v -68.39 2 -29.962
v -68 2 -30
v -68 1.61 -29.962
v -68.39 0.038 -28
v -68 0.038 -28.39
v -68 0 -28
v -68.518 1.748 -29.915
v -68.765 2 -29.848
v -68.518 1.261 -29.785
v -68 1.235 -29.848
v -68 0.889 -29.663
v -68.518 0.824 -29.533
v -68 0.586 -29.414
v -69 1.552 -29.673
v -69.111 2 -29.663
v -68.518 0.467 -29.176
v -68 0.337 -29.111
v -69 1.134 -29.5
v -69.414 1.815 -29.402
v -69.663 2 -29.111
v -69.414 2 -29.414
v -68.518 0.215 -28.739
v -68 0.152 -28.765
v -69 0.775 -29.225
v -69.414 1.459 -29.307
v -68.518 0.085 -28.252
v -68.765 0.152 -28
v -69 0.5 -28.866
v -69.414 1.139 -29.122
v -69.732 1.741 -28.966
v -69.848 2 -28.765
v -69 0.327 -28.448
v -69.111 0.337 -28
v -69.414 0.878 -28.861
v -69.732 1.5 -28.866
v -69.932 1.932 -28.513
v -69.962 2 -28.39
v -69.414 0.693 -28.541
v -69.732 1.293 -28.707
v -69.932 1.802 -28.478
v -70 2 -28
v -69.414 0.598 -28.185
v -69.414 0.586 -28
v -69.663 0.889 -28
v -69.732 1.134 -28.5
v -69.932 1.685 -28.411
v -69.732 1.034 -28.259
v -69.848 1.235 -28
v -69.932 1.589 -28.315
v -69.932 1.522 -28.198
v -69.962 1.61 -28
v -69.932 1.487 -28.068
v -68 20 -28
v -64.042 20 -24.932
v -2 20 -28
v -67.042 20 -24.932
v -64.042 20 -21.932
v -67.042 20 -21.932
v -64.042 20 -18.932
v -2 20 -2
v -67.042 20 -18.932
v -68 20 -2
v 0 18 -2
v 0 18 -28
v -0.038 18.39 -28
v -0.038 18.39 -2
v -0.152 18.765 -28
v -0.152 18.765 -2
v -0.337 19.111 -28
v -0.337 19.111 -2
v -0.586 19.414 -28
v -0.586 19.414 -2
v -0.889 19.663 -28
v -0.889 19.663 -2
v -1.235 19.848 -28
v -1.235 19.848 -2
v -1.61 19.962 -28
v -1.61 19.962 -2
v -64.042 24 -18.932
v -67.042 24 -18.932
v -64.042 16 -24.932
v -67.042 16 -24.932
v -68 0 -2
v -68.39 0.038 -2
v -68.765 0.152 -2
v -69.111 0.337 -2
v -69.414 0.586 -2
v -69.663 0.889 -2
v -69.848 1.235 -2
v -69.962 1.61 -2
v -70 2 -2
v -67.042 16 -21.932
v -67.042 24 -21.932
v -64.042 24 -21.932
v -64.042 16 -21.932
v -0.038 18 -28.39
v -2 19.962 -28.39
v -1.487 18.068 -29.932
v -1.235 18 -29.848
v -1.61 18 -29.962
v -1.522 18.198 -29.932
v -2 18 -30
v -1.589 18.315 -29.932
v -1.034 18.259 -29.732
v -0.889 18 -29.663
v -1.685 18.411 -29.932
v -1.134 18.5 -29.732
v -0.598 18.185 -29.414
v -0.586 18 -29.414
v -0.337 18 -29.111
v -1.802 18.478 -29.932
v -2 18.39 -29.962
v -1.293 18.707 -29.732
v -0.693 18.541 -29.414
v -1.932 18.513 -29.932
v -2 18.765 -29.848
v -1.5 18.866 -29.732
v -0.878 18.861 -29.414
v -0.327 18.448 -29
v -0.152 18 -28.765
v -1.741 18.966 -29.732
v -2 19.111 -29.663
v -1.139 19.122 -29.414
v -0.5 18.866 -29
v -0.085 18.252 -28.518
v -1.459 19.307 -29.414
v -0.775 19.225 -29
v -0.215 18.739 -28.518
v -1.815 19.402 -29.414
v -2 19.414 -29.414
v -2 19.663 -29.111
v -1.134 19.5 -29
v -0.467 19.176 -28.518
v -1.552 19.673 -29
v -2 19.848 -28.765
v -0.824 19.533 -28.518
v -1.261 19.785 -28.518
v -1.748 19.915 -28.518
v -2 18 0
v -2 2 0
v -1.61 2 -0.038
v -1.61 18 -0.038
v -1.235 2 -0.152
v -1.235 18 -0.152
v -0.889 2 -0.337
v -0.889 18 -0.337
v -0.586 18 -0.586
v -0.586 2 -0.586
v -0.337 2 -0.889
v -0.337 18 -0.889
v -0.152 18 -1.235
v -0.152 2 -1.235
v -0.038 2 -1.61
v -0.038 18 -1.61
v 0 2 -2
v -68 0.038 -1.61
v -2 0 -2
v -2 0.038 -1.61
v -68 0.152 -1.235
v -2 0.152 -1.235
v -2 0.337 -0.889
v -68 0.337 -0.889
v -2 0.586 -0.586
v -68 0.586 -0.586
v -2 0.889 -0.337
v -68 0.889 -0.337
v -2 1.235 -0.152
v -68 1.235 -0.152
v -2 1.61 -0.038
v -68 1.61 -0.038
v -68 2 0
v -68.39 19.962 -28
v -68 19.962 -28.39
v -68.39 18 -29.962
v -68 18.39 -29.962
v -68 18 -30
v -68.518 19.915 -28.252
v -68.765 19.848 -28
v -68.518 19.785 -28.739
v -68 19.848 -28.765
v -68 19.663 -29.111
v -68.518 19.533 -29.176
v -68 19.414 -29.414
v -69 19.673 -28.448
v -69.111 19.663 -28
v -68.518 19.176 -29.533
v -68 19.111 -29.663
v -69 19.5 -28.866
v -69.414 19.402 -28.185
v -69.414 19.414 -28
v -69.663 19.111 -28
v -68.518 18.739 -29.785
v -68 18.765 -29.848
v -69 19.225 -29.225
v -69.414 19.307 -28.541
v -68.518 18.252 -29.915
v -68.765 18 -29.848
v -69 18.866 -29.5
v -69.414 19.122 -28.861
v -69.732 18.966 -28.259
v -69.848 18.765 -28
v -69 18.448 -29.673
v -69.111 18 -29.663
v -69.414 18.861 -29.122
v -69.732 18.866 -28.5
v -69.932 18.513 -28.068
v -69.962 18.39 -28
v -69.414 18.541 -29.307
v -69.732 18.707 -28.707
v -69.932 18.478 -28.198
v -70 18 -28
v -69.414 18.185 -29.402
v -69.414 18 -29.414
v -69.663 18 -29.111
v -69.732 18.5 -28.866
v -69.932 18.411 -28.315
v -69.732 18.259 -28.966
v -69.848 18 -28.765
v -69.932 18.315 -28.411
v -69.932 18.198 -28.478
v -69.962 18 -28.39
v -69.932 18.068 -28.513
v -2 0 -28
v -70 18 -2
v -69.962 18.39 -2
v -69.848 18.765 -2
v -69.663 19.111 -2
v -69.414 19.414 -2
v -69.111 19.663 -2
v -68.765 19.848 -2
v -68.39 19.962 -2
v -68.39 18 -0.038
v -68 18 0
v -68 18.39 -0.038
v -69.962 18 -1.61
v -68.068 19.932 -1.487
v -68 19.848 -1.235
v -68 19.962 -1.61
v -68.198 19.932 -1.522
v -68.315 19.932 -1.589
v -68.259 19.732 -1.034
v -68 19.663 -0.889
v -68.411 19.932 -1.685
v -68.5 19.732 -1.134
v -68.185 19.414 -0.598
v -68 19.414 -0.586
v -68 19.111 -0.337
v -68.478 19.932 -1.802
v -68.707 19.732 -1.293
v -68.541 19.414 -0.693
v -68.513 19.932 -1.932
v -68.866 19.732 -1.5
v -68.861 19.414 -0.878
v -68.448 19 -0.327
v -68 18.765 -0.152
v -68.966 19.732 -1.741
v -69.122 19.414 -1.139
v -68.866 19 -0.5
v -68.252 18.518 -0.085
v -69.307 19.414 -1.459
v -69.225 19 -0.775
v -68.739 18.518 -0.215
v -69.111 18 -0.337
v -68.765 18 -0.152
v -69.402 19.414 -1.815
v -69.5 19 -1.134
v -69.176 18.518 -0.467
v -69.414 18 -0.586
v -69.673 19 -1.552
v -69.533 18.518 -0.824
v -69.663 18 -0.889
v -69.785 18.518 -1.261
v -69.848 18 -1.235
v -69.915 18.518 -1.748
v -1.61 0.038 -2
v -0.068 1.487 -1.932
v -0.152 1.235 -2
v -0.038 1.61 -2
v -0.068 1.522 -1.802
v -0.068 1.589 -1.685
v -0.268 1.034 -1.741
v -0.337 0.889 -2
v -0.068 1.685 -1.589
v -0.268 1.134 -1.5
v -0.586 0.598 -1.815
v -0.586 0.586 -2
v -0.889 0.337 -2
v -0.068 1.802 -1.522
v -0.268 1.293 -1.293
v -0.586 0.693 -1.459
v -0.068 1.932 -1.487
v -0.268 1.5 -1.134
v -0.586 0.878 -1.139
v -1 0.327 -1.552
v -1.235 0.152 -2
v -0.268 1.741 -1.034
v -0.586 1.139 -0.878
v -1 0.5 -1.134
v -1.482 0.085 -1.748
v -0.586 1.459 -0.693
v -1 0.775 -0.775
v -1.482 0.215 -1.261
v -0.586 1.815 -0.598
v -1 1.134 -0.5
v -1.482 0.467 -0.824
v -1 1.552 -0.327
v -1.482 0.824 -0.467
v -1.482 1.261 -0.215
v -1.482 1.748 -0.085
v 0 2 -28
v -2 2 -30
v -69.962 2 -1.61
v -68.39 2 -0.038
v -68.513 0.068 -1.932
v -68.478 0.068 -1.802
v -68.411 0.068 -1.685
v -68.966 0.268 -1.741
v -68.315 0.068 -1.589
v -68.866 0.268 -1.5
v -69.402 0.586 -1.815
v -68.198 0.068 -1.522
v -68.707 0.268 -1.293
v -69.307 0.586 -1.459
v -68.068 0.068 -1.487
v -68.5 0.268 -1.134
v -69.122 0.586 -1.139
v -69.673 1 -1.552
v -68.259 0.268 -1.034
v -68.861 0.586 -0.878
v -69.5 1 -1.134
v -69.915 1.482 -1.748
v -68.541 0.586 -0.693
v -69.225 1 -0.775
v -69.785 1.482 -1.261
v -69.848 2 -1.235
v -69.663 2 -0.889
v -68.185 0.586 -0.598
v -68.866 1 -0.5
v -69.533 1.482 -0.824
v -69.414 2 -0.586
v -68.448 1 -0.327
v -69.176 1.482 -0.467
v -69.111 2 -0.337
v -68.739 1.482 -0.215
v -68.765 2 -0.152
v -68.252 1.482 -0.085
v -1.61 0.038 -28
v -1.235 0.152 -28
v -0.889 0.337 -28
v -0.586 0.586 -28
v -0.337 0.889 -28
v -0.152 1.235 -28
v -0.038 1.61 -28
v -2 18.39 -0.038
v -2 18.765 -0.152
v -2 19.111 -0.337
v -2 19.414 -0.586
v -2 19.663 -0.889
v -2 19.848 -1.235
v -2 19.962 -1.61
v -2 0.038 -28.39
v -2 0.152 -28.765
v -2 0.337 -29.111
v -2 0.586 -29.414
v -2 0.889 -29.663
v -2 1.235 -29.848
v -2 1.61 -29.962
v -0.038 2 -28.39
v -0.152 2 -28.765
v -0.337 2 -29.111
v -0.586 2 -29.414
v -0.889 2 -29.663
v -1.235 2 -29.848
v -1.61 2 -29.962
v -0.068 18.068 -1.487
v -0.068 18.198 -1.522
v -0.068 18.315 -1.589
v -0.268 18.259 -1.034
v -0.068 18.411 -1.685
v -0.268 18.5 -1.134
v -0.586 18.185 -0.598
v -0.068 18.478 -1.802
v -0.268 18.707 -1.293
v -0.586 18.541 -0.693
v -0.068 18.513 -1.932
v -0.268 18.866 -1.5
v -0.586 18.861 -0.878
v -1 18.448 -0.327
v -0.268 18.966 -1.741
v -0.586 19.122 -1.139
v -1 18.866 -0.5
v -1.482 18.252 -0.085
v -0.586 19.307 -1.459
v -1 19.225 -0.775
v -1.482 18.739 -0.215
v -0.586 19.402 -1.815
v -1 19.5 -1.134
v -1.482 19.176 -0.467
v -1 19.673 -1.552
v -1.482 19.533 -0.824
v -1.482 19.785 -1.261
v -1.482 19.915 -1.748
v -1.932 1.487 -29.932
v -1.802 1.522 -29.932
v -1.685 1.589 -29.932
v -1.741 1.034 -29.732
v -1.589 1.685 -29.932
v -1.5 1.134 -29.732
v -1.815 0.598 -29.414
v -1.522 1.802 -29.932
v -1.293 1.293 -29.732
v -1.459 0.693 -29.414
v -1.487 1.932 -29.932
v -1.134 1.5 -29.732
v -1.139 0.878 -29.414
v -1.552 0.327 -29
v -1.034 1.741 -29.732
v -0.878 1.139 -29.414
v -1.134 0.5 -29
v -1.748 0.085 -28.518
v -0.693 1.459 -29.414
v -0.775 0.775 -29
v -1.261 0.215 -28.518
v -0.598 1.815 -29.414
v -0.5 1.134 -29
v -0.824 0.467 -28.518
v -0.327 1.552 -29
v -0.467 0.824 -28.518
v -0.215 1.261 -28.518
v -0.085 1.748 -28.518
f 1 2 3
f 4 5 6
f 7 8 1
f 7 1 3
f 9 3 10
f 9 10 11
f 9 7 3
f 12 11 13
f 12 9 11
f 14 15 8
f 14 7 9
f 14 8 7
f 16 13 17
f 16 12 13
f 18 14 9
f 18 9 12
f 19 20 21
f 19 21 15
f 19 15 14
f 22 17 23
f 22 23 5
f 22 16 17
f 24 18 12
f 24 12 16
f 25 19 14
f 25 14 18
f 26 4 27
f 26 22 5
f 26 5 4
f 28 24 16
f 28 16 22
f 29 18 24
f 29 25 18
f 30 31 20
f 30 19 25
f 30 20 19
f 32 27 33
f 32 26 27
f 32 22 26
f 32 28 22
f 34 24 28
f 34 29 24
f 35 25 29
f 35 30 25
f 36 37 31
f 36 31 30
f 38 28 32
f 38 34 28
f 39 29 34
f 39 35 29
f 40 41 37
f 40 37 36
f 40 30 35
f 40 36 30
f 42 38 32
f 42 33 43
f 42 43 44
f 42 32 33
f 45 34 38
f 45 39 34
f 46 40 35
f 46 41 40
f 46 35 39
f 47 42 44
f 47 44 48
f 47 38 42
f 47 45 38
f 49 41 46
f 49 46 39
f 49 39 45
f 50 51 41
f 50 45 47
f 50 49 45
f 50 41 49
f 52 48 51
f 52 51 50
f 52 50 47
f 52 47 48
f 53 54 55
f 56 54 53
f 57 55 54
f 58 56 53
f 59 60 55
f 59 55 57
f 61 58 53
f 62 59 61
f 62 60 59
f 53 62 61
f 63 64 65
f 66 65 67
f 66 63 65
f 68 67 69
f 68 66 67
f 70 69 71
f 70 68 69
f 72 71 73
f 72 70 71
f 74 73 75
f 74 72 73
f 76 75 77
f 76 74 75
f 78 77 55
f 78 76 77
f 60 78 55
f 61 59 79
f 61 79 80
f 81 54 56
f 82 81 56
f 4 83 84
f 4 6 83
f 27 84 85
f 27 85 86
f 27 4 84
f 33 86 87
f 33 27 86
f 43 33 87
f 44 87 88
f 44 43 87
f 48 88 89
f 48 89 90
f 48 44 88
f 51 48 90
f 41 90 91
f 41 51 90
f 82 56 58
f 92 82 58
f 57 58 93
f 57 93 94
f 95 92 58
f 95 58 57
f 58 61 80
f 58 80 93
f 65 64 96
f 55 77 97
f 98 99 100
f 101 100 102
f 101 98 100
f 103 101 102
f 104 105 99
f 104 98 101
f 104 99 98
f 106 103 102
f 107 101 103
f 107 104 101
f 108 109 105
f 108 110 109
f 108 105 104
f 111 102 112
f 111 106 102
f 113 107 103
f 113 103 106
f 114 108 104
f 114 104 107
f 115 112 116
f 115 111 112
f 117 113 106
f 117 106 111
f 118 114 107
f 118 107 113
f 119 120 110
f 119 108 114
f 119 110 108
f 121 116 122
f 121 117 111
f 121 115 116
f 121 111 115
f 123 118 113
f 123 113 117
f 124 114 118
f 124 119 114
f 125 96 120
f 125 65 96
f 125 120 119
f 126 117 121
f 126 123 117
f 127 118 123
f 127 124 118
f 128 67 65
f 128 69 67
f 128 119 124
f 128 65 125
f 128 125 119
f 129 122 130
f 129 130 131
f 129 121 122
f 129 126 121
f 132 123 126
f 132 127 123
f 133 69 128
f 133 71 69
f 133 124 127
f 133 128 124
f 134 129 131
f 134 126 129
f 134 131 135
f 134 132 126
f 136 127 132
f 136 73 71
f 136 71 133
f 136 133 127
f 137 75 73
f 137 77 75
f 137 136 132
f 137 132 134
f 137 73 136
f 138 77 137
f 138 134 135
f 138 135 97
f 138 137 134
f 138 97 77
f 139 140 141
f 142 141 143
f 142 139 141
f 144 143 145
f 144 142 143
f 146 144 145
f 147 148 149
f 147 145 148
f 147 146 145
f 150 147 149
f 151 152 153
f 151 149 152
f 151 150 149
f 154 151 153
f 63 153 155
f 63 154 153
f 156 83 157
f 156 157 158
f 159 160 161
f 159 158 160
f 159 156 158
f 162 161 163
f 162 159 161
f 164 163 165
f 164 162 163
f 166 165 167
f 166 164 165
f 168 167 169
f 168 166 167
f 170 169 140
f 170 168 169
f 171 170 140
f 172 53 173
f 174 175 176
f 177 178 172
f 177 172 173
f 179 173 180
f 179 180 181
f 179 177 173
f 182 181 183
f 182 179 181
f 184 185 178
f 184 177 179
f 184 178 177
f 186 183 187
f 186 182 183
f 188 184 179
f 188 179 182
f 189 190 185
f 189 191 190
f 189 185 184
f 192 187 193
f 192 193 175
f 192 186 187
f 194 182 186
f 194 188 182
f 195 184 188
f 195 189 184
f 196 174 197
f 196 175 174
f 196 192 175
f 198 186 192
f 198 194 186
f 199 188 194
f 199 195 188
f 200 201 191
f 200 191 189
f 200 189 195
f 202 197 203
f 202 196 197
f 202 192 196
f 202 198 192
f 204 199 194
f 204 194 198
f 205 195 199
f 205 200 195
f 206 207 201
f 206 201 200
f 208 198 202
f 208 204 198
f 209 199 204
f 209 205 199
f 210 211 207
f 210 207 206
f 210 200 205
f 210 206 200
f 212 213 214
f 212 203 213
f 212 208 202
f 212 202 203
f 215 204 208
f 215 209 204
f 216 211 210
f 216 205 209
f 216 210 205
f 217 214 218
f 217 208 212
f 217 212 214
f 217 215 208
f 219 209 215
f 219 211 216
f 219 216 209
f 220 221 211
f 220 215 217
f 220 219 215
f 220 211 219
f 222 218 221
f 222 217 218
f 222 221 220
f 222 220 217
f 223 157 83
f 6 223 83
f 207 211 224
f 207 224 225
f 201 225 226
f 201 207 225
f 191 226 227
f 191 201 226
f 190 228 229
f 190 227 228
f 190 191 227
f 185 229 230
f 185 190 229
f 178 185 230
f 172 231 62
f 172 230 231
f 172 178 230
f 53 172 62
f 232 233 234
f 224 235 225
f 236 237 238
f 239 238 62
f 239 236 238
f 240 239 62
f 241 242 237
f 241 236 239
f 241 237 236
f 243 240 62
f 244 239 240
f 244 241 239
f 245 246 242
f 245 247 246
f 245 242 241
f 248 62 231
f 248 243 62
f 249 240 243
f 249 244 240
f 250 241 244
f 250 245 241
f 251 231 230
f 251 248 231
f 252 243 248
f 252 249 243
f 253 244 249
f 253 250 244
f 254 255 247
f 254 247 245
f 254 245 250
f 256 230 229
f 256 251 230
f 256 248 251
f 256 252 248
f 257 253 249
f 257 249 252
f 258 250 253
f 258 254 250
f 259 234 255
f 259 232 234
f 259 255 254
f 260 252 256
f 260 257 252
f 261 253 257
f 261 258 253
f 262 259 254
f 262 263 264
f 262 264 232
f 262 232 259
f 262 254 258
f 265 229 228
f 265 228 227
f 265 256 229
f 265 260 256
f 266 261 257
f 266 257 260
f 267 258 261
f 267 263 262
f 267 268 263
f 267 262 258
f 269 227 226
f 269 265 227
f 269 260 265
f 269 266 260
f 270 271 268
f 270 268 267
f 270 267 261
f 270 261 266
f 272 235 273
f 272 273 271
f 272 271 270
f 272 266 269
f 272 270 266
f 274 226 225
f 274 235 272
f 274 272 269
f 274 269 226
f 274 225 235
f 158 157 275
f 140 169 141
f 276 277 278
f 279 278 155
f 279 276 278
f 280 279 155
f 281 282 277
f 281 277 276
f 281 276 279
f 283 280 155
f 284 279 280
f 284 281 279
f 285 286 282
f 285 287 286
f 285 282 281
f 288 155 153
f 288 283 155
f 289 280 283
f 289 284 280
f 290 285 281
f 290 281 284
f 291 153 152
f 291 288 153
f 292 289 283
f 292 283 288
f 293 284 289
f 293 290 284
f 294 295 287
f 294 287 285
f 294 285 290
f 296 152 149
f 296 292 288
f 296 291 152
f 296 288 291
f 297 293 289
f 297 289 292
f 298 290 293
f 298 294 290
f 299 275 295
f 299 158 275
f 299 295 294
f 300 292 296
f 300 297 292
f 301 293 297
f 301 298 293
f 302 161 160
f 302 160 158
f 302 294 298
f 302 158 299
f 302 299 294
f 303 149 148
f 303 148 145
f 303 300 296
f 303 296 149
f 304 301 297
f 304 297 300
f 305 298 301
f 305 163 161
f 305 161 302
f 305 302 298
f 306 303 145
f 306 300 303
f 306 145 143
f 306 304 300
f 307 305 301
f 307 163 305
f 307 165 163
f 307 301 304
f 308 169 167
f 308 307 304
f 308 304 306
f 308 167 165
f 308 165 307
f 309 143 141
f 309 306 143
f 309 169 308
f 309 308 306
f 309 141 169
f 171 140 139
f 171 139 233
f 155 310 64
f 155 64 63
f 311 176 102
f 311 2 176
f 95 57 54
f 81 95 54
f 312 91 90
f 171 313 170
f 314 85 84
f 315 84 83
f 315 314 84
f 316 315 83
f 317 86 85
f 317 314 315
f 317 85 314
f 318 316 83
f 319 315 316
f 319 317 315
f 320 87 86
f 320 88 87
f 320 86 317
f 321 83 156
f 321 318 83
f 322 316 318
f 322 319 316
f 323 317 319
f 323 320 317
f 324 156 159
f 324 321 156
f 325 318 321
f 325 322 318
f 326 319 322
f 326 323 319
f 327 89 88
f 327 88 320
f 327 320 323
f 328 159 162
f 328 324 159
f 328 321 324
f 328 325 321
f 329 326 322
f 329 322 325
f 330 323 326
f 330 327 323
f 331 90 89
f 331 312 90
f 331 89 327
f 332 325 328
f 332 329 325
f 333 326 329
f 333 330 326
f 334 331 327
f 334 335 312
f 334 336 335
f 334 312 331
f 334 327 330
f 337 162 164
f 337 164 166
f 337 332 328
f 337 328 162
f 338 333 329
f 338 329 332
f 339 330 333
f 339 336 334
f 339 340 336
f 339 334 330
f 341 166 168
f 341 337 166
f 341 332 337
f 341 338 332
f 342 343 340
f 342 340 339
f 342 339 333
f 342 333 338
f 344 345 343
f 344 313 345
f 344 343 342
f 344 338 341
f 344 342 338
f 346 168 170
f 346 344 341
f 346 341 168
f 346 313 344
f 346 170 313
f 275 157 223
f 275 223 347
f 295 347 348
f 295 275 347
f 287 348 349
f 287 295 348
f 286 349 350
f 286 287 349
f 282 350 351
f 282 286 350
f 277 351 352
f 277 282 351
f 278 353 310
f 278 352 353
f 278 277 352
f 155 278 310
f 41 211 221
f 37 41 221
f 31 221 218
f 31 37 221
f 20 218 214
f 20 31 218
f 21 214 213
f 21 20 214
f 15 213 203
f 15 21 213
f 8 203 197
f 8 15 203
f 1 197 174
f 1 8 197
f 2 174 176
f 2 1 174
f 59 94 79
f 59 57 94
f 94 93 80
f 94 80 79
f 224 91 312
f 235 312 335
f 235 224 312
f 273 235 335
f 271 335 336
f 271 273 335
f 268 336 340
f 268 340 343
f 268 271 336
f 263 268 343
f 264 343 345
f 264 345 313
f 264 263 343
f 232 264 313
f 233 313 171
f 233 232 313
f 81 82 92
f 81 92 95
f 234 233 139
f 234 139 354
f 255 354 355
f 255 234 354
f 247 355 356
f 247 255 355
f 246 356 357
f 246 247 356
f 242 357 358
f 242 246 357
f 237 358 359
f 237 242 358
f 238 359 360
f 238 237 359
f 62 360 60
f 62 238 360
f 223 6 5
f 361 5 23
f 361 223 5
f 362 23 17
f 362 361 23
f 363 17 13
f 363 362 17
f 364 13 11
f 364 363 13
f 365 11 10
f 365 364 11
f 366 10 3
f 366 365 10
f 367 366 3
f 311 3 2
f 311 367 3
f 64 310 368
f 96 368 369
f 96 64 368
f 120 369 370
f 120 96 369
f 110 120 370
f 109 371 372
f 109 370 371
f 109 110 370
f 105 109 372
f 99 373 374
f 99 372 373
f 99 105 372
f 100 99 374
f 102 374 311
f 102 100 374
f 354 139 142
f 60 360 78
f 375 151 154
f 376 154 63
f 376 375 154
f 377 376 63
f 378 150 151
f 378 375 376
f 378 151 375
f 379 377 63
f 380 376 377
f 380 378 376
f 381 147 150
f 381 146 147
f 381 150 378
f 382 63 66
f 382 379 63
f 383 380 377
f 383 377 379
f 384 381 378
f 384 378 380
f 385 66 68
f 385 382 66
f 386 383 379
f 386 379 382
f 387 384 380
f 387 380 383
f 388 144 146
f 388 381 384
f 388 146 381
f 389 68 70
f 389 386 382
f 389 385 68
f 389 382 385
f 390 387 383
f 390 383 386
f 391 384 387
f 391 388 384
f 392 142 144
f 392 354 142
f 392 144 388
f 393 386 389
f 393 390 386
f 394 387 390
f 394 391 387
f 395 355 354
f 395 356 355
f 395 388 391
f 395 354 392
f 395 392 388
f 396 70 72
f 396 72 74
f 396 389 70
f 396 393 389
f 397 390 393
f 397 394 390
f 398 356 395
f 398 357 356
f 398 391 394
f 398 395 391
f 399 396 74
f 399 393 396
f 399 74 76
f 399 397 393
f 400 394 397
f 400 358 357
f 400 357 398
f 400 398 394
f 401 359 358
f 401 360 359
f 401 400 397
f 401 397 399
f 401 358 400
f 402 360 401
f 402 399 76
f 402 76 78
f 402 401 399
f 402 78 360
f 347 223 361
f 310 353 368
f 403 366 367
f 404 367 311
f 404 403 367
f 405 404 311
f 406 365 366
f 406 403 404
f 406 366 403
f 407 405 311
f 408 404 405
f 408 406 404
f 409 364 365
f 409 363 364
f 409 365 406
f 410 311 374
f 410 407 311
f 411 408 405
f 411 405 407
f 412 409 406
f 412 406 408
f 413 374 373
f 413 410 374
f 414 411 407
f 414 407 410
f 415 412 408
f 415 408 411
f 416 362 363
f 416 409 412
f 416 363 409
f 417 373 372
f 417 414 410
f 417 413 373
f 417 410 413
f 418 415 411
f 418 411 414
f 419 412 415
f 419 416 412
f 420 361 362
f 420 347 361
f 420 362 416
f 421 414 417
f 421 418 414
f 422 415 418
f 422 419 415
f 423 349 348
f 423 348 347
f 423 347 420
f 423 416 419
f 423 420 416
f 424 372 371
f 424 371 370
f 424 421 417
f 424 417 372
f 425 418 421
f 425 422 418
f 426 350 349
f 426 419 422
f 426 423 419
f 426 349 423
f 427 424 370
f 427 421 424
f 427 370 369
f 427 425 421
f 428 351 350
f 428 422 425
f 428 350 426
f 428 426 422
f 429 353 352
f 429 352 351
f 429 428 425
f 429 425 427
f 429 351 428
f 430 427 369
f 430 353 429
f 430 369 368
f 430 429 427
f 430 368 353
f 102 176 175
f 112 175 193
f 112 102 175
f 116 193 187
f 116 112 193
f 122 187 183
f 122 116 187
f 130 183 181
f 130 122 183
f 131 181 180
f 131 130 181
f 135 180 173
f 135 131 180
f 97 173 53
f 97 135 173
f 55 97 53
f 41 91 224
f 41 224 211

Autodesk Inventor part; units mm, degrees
ref_plane "YZ Plane" through (0, 0, 0) normal (1, 0, 0) x (0, 1, 0)
ref_plane "XZ Plane" through (0, 0, 0) normal (0, 1, 0) x (-1, 0, 0)
ref_plane "XY Plane" through (0, 0, 0) normal (0, 0, 1) x (1, 0, 0)
sketch "Sketch1" plane through (0, 0, 0) normal (0, 1, 0) x (-1, 0, 0)
  line L0 (0, 0) -> (70, 0)
  line L1 (70, 0) -> (70, -30)
  line L2 (70, -30) -> (0, -30)
  line L3 (0, -30) -> (0, 0)
  dimension "d0" = 70
  dimension "d1" = 30
extrude "Extrusion1" add sketch "Sketch1" along normal blind 20
fillet "Fillet1" radius 2 11 edges at (-70, 10, 0) (-70, 20, -15) (-35, 20, 0) (-70, 0, -15) (-35, 0, 0) (0, 10, 0) (0, 20, -15) (0, 0, -15) (0, 10, -30) (-35, 20, -30) (-35, 0, -30)
sketch "Sketch2" plane through (0, 20, 0) normal (0, 1, 0) x (1, 0, 0)
  line L0 (-67.0416, 18.9322) -> (-64.0416, 18.9322)
  line L1 (-64.0416, 18.9322) -> (-64.0416, 24.9322)
  line L2 (-64.0416, 24.9322) -> (-67.0416, 24.9322)
  line L3 (-67.0416, 24.9322) -> (-67.0416, 18.9322)
  point P0 (0, 0)
  dimension "d6" = 3
  dimension "d7" = 6
fillet "Fillet2" radius 2 3 edges at (-69.4142, 19.4142, -29.4142) (-69.4142, 0.5858, -29.4142) (-70, 10, -30)
extrude "Extrusion2" cut sketch "Sketch2" against normal blind 4
sketch "Sketch3" plane through (0, 16, 0) normal (0, 1, 0) x (1, 0, 0)
  line L0 (-64.0416, 18.9322) -> (-67.0416, 18.9322) projected
  line L1 (-67.0416, 18.9322) -> (-67.0416, 24.9322) projected
  line L2 (-64.0416, 18.9322) -> (-67.0416, 18.9322)
  line L3 (-67.0416, 18.9322) -> (-67.0416, 21.9322)
  line L4 (-67.0416, 21.9322) -> (-64.0416, 21.9322)
  line L5 (-64.0416, 21.9322) -> (-64.0416, 18.9322)
  point P0 (0, 0)
extrude "Extrusion3" add sketch "Sketch3" along normal blind 8
equation "\"BendRadius\" = Thickness"
equation "\"BendReliefWidth\" = Thickness"
equation "\"BendReliefDepth\" = 0.5 * Thickness"
equation "\"CornerReliefSize\" = 4 * Thickness"
equation "\"MinimumRemnant\" = 2 * Thickness"
equation "\"TransitionRadius\" = BendRadius"
equation "\"JacobiRadiusSize\" = BendRadius"
equation "\"GapSize\" = Thickness"
equation "\"Thickness\" = 0.5"
